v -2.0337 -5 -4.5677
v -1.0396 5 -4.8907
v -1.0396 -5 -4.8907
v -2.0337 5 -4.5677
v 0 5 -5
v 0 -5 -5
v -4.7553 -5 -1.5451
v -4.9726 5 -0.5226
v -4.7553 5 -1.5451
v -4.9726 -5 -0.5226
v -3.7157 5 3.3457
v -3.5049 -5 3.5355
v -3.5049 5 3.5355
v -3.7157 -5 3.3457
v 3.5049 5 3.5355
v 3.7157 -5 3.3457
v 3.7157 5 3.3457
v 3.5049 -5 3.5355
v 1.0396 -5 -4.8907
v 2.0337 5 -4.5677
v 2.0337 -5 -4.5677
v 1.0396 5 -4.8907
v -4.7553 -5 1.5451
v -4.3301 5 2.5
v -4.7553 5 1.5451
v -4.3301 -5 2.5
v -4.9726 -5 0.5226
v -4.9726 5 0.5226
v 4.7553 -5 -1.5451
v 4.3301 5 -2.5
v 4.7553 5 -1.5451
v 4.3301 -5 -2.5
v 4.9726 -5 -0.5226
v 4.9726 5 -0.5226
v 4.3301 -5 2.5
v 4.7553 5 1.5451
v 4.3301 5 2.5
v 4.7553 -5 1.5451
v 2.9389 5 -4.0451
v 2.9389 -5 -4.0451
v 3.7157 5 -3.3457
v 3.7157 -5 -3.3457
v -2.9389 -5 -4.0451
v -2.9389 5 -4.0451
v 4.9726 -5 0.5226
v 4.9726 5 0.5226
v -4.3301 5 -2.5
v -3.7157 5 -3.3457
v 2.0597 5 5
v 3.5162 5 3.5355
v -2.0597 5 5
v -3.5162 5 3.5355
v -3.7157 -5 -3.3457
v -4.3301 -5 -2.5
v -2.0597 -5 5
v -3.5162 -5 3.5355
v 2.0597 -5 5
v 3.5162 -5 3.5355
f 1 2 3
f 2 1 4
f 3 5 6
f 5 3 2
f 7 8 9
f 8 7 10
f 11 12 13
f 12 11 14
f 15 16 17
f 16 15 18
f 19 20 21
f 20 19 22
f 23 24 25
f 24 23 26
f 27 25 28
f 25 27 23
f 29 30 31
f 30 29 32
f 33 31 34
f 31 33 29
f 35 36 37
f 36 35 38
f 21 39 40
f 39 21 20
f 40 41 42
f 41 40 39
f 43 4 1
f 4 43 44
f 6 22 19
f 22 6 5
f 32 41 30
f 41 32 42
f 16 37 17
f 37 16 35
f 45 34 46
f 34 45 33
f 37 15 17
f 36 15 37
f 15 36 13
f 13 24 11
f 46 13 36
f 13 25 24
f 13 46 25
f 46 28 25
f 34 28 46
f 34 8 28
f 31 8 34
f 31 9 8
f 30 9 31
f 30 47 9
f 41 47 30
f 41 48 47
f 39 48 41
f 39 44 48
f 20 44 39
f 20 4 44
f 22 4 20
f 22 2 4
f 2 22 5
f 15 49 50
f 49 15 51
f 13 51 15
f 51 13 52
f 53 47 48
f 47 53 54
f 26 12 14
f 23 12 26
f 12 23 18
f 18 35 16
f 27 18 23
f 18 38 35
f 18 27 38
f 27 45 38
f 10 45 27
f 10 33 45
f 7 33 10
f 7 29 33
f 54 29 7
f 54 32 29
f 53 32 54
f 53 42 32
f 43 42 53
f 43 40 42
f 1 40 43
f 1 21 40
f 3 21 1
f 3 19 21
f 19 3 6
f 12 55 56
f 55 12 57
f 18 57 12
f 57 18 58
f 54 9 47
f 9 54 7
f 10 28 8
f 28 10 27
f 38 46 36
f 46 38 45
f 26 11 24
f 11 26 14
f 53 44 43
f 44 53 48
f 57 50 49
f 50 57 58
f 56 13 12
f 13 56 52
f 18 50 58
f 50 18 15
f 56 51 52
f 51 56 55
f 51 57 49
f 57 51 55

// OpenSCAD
/**
 * flat_teardrop.scad
 *
 * A simple intersection method to implement a flat or truncated teardrop.
 *
 * The 45 degree slope of the sides of a teardrop shape are easier for most printers
 * to produce than a normal circular hole, but the pointy tip of teardrop module in
 * [MCAD](https://github.com/SolidCode/MCAD) is unnecessary for small holes, and can
 * use up valuable overhead clearance that you might need to keep your part small.
 * By expanding on the teardrop module in MCAD, this module produces a the best 
 * printable shape while diverging as little as possible from the desired shape of a
 * circular hole.
 *
 * This openSCAD library is part of the [dotscad](https://github.com/dotscad/dotscad)
 * project.
 *
 * @copyright  Chris Petersen, 2013
 * @license    http://creativecommons.org/licenses/LGPL/2.1/
 * @license    http://creativecommons.org/licenses/by-sa/3.0/
 *
 * @see        http://www.thingiverse.com/thing:122032
 * @source     https://github.com/dotscad/dotscad/blob/master/flat_teardrop.scad
 *
 * @param float radius Radius of the teardrop cylinder
 * @param float length Length of the teardrop
 * @param float angle  Angle of the teardrop.
 */
use <MCAD/teardrop.scad>;
module flat_teardrop(radius, length, angle) {
    intersection() {
        rotate([0, angle, 0]) {
            cube(size=[radius * 2, radius * 2, length], center=true);
        }
        teardrop(radius, length, angle);
    }
}

/*
 * When this file is opened directly in OpenSCAD, the following code will render an
 * example of the functions it provides.  This example will *not* render if this module
 * is imported into your own project via the `use` statement.
 */
flat_teardrop_example();
module flat_teardrop_example($fn=50) {
    rotate([0,0,90]) flat_teardrop(5, 10, 90);
}
